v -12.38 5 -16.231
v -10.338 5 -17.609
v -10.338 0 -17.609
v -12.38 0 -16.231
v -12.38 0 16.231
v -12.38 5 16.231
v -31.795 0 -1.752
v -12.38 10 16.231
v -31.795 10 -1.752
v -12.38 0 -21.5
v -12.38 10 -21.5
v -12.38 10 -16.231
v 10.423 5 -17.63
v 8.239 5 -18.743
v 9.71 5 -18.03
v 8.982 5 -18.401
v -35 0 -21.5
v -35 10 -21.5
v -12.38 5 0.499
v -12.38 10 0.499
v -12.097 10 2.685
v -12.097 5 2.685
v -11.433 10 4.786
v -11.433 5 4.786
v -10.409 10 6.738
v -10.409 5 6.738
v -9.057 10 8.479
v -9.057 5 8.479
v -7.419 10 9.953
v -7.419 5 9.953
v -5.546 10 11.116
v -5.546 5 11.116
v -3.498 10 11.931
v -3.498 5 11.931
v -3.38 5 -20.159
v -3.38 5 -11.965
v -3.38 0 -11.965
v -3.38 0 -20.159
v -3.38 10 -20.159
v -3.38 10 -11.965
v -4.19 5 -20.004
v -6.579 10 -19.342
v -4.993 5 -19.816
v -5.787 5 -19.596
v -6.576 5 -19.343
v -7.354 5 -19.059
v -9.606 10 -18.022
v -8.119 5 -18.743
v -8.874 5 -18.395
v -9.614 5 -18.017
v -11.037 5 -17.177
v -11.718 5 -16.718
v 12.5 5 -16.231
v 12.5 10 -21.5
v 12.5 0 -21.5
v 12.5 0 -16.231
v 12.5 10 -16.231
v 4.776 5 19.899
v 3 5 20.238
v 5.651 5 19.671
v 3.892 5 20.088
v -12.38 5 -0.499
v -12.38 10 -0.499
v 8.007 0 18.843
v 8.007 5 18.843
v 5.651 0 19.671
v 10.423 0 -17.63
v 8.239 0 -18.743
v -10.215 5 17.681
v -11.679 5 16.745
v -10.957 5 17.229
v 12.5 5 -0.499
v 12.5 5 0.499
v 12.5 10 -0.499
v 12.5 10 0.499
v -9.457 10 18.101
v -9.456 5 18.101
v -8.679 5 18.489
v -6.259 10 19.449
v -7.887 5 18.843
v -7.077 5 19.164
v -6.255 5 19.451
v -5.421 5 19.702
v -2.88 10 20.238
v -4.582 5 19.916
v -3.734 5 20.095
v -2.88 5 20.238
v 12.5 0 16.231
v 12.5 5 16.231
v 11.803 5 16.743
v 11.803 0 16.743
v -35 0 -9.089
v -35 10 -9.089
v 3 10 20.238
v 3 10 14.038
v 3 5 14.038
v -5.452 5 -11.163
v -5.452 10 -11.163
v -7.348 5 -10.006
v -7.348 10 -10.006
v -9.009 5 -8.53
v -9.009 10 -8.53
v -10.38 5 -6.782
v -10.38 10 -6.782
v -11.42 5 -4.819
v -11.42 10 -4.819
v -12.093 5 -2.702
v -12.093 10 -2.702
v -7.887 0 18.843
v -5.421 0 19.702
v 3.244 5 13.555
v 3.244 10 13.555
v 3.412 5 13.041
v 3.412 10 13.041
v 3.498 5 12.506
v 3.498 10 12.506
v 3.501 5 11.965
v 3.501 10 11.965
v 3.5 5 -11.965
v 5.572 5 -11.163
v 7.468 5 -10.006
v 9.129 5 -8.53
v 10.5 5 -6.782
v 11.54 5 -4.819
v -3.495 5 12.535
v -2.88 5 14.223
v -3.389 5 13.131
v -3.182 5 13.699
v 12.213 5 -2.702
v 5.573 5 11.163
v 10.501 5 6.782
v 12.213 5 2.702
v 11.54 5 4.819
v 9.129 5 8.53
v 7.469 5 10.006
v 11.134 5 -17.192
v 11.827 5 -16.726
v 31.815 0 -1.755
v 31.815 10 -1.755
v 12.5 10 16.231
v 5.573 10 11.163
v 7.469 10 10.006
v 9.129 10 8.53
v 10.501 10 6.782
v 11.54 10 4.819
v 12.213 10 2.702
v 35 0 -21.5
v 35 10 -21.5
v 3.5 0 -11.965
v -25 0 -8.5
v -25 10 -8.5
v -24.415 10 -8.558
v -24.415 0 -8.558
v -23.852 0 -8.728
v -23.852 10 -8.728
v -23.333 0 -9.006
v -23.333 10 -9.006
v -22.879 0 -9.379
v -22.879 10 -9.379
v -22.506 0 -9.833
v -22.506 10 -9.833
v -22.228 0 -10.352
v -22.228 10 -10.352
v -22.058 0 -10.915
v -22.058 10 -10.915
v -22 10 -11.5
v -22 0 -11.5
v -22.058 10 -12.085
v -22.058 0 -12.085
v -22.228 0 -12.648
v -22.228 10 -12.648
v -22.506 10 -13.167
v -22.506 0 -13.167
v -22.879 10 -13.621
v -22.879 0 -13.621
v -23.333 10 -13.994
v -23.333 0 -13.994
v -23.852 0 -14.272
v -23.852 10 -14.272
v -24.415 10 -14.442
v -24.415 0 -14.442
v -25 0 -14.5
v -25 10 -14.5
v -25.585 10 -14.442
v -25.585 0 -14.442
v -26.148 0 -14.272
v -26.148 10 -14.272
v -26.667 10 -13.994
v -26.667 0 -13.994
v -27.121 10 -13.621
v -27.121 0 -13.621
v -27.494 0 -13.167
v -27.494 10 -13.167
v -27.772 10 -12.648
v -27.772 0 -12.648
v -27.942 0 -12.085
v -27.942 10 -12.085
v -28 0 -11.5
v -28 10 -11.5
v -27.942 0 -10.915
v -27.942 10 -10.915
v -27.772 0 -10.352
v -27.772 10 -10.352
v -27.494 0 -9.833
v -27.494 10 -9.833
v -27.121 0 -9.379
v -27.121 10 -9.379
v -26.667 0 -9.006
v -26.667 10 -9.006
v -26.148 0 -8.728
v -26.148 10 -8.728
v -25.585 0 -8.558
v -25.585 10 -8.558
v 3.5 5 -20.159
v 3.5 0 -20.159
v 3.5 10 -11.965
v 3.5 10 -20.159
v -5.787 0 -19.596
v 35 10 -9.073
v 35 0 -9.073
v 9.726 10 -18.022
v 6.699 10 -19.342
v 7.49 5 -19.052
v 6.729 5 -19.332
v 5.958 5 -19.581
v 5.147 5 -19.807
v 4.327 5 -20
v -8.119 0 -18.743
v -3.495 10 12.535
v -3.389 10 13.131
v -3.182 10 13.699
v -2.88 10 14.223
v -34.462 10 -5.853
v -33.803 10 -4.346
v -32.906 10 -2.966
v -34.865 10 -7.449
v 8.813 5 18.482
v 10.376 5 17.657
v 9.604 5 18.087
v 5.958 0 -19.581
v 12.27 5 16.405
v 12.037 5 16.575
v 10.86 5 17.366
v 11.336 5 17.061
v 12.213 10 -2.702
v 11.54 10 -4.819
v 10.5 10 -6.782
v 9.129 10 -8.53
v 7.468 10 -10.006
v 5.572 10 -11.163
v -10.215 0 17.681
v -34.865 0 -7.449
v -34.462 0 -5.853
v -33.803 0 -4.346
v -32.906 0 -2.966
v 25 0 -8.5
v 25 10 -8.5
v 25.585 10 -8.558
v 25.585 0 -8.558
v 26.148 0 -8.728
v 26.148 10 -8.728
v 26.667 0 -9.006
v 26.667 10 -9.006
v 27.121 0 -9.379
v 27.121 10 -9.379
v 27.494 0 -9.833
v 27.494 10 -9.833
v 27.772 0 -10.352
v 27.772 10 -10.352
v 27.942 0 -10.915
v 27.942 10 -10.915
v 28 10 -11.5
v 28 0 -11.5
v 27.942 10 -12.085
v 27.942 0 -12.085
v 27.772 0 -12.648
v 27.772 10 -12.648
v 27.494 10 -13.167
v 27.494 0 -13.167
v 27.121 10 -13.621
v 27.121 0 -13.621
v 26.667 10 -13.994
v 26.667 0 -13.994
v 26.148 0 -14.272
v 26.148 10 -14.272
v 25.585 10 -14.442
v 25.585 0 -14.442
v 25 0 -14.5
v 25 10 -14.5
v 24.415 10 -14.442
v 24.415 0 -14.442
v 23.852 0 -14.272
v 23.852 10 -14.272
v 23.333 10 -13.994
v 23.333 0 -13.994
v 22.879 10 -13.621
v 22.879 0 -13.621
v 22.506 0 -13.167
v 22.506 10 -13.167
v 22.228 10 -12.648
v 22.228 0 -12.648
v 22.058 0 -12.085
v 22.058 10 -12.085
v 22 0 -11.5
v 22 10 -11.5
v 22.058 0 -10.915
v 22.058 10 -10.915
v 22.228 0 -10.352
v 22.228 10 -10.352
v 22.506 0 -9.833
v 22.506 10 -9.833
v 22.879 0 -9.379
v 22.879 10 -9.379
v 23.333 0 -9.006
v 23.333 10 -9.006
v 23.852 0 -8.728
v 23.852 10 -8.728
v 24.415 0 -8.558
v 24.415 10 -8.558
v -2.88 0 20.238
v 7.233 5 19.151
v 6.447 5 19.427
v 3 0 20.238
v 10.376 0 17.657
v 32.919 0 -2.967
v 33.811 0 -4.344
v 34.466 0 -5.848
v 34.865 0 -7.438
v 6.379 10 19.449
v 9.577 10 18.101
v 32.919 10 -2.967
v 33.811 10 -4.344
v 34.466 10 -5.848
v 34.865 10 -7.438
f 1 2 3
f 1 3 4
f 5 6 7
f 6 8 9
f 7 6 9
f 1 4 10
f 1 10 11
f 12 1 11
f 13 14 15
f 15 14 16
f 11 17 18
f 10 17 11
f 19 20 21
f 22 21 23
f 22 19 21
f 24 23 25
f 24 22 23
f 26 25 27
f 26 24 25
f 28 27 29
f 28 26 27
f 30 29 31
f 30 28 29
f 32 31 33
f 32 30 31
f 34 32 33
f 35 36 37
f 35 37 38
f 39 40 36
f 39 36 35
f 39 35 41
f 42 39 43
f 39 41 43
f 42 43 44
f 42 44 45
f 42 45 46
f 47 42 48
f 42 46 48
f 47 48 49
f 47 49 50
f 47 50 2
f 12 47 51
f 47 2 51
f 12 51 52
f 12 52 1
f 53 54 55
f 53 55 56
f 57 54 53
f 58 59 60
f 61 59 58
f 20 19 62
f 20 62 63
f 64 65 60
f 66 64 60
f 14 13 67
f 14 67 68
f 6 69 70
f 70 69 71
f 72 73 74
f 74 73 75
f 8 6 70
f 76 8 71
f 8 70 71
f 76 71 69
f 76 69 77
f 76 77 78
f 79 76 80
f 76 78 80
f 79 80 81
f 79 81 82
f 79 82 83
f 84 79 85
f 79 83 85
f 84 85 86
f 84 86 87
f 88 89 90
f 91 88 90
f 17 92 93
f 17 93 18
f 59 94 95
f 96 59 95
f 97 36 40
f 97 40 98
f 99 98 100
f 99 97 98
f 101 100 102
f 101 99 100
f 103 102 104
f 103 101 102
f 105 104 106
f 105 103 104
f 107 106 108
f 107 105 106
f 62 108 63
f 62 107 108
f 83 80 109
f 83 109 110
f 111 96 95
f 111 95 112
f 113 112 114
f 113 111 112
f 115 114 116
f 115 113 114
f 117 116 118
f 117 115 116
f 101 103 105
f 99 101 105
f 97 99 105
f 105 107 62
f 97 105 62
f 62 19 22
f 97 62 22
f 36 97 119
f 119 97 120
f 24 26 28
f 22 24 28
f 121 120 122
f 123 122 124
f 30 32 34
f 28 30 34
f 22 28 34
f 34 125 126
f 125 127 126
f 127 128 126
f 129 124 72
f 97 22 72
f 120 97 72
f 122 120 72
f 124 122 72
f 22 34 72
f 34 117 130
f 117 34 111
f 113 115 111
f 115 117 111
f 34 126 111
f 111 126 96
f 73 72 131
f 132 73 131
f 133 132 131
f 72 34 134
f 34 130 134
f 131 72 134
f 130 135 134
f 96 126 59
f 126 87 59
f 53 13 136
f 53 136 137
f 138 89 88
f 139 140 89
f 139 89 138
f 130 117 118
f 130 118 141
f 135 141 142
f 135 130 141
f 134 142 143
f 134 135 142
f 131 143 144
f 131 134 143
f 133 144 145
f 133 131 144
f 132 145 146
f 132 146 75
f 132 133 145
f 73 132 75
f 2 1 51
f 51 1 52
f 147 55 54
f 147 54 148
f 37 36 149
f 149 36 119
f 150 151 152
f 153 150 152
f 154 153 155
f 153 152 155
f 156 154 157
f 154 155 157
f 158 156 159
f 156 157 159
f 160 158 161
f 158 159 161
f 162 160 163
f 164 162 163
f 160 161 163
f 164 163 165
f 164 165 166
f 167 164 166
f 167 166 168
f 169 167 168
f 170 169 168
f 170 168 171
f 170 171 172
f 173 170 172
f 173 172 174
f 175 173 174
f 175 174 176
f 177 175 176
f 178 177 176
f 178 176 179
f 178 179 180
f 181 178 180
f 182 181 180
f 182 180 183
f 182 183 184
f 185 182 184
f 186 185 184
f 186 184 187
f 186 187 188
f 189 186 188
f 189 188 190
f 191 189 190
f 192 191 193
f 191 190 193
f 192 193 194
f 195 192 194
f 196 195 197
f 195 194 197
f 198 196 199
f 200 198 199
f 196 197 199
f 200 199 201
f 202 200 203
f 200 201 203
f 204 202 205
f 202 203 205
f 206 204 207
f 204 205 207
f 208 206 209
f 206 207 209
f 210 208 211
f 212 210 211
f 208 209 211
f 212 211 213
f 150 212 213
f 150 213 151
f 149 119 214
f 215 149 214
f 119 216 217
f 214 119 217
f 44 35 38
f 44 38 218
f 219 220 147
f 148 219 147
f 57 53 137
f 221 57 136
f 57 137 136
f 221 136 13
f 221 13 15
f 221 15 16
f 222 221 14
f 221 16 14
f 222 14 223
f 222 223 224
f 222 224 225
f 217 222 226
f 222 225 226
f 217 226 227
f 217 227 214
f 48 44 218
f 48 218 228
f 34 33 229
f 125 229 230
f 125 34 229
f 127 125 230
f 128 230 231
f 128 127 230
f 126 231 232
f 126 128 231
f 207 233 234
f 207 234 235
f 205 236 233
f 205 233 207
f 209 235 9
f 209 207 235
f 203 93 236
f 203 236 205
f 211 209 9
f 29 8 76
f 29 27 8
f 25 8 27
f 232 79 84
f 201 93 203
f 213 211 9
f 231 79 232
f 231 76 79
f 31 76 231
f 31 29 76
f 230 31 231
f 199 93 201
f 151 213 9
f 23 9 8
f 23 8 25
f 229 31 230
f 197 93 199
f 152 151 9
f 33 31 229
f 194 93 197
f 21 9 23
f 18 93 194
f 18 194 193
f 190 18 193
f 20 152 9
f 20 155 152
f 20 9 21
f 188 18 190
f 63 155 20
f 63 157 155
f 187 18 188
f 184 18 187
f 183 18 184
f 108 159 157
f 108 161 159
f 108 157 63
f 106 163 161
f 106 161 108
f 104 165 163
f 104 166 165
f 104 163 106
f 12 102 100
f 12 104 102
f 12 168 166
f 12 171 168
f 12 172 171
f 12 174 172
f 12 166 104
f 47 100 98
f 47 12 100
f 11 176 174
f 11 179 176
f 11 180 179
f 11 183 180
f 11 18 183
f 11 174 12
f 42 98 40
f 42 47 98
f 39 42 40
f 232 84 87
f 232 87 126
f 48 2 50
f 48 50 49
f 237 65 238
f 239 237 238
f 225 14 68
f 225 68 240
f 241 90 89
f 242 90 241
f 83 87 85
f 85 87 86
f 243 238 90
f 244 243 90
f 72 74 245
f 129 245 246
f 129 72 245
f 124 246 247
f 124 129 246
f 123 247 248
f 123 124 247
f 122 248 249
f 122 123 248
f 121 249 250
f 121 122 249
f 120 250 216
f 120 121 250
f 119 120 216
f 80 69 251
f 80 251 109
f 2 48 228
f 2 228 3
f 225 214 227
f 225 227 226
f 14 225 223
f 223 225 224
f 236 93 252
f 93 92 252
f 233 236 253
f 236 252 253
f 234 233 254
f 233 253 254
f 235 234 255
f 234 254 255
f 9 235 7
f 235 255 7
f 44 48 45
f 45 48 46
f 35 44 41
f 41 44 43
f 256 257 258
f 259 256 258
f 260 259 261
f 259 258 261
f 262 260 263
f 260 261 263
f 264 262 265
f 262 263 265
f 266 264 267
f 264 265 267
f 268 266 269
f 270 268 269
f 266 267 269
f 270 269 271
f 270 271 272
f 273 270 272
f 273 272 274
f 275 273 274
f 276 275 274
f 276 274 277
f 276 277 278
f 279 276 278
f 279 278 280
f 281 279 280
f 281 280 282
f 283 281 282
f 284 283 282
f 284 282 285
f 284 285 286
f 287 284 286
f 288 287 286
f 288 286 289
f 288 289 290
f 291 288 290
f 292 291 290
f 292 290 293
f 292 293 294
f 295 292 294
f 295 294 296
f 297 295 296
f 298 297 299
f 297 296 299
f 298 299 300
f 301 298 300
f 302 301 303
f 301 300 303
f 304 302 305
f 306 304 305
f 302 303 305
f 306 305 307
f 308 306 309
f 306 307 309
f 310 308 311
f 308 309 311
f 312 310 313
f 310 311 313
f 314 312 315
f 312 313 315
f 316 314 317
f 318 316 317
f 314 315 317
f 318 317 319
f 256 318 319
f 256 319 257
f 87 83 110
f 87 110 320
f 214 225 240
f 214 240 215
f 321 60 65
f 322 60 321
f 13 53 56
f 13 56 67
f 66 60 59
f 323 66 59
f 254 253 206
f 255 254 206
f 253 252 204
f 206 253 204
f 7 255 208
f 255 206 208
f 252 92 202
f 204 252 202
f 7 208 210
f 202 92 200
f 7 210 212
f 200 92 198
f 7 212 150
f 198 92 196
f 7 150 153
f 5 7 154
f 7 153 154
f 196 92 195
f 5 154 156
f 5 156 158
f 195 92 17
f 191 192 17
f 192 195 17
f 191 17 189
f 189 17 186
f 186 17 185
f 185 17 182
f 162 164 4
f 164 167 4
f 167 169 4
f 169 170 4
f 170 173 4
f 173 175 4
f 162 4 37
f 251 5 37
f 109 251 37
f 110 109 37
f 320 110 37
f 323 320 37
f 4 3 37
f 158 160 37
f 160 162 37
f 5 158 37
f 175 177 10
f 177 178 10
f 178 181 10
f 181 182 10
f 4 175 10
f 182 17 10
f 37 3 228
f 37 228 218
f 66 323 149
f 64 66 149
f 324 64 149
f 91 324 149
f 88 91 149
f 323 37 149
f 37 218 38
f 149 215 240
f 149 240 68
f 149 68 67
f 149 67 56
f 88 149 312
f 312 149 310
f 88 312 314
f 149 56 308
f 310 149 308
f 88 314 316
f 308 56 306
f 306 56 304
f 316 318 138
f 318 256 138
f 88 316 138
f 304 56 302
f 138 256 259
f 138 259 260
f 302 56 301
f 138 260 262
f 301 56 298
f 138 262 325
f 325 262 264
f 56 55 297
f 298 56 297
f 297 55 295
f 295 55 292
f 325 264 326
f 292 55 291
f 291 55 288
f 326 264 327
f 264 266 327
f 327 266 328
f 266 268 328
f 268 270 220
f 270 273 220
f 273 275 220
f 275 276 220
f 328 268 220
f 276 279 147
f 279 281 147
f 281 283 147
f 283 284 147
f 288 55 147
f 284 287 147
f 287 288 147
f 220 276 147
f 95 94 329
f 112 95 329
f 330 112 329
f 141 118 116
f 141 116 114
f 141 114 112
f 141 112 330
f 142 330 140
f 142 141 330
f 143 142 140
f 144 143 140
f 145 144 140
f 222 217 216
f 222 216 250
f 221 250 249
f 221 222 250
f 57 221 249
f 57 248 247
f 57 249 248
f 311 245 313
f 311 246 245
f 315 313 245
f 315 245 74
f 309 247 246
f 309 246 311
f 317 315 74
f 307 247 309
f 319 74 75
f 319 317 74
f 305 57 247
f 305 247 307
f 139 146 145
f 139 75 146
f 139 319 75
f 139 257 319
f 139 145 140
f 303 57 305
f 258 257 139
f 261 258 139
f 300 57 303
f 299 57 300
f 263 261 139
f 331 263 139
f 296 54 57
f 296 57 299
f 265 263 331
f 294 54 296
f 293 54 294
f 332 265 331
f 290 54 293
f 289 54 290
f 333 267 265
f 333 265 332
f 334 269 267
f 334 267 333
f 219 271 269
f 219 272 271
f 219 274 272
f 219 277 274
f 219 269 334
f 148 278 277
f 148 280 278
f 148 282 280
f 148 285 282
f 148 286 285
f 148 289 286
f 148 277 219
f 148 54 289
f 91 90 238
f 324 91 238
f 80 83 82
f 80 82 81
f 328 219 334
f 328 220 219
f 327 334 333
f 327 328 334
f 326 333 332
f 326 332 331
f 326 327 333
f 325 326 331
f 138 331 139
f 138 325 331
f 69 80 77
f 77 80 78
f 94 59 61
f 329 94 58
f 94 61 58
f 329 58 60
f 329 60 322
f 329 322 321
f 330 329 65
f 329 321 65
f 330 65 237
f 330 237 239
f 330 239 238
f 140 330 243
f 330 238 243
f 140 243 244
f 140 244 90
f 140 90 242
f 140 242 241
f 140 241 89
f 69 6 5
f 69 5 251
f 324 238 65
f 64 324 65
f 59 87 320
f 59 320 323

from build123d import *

# Parameters (mm, degrees)
SKETCH_1_W             = 70
SKETCH_1_H             = 43
EXTRUDE_1_DEPTH        = 10
SKETCH_8_W             = 24.88
SKETCH_8_H             = 5
CUT_EXTRUDE_4_DEPTH    = 57.338264084
EXTRUDE_1_2_DEPTH      = 5
EXTRUDE_1_2_DEPTH_BACK = 2
SKETCH_11_R            = 20.45
SKETCH_11_R_2          = 12.45
CUT_EXTRUDE_6_DEPTH    = 5
CUT_EXTRUDE_7_DEPTH    = 5
SKETCH_16_W            = 5.88
SKETCH_16_H            = 11
CUT_EXTRUDE_8_DEPTH    = 5
SKETCH_17_W            = 5.88
SKETCH_17_H            = 8.352111755
CUT_EXTRUDE_9_DEPTH    = 5
CUT_EXTRUDE_10_DEPTH   = 5
CUT_EXTRUDE_11_DEPTH   = 5
SKETCH_21_R            = 3
CUT_EXTRUDE_12_DEPTH   = 43.275879648
SKETCH_22_R            = 3
CUT_EXTRUDE_13_DEPTH   = 43.275879648
SKETCH_24_R            = 3.51
CUT_EXTRUDE_15_DEPTH   = 7
SKETCH_27_W            = 5.88
SKETCH_27_H            = 8.139673367
CUT_EXTRUDE_16_DEPTH   = 7
SKETCH_31_W            = 6.88
SKETCH_31_H            = 8.484679277
CUT_EXTRUDE_21_DEPTH   = 14.5
CUT_EXTRUDE_22_DEPTH   = 42.379342672
CUT_EXTRUDE_23_DEPTH   = 42.379342672
CUT_EXTRUDE_24_DEPTH   = 42.379342672
CUT_EXTRUDE_25_DEPTH   = 14.5
CUT_EXTRUDE_26_DEPTH   = 14.5
CUT_EXTRUDE_27_DEPTH   = 14.5
FILLET_1_R             = 10


with BuildPart() as part:
    # 草圖1 → Extrude 1 (new body)
    with BuildSketch(Plane(origin=(0, 0, 0), x_dir=(1, 0, 0), z_dir=(0, 1, 0))):
        Rectangle(SKETCH_1_W, SKETCH_1_H)
    extrude(amount=EXTRUDE_1_DEPTH)

    # 草圖8 → 除料-伸長4 (cut, through all)
    with BuildSketch(Plane.XY.offset(21.5)):
        with Locations((0.06, 7.5)):
            Rectangle(SKETCH_8_W, SKETCH_8_H)
    extrude(amount=-CUT_EXTRUDE_4_DEPTH, mode=Mode.SUBTRACT)

    # 草圖11 → Extrude 1 2 (add, two sides: drawn at the far end of the back side and taken through both)
    with BuildSketch(Plane(origin=(0, 5, 0), x_dir=(1, 0, 0), z_dir=(0, 1, 0)).offset(-EXTRUDE_1_2_DEPTH_BACK)):
        with Locations((0.06, 0)):
            Circle(SKETCH_11_R)
        with Locations((0.06, 0)):
            Circle(SKETCH_11_R_2, mode=Mode.SUBTRACT)
    extrude(amount=EXTRUDE_1_2_DEPTH + EXTRUDE_1_2_DEPTH_BACK)

    # 草圖14 → 除料-伸長6 (cut)
    with BuildSketch(Plane(origin=(0, 5, 0), x_dir=(1, 0, 0), z_dir=(0, 1, 0))):
        Polygon((0.06, -20.45), (12.5, -20.45), (12.5, -21.5), (-12.38, -21.5), (-12.38, -20.45), align=None)
    extrude(amount=-CUT_EXTRUDE_6_DEPTH, mode=Mode.SUBTRACT)

    # 草圖15 → 除料-伸長7 (cut)
    with BuildSketch(Plane(origin=(0, 5, 0), x_dir=(1, 0, 0), z_dir=(0, 1, 0))):
        Polygon((0.06, 20.45), (12.5, 20.45), (12.5, 21.5), (-12.38, 21.5), (-12.38, 20.45), align=None)
    extrude(amount=-CUT_EXTRUDE_7_DEPTH, mode=Mode.SUBTRACT)

    # 草圖16 → 除料-伸長8 (cut)
    with BuildSketch(Plane(origin=(0, 10, 0), x_dir=(1, 0, 0), z_dir=(0, 1, 0))):
        with Locations((0.06, 17.597888245)):
            Rectangle(SKETCH_16_W, SKETCH_16_H)
    extrude(amount=-CUT_EXTRUDE_8_DEPTH, mode=Mode.SUBTRACT)

    # 草圖17 → 除料-伸長9 (cut)
    with BuildSketch(Plane(origin=(0, 10, 0), x_dir=(1, 0, 0), z_dir=(0, 1, 0))):
        with Locations((0.06, -16.273944123)):
            Rectangle(SKETCH_17_W, SKETCH_17_H)
    extrude(amount=-CUT_EXTRUDE_9_DEPTH, mode=Mode.SUBTRACT)

    # 草圖19 → 除料-伸長10 (cut)
    with BuildSketch(Plane(origin=(0, 5, 0), x_dir=(1, 0, 0), z_dir=(0, 1, 0))):
        Polygon((-2.88, 20.237561612), (-2.88, 20.45), (2.98755849, 20.45), (3, 20.237561612), align=None)
    extrude(amount=-CUT_EXTRUDE_10_DEPTH, mode=Mode.SUBTRACT)

    # 草圖20 → 除料-伸長11 (cut)
    with BuildSketch(Plane(origin=(0, 5, 0), x_dir=(1, 0, 0), z_dir=(0, 1, 0))):
        Polygon((3, -20.237561612), (3, -20.45), (-2.887827835, -20.45), (-2.88, -20.237561612), align=None)
    extrude(amount=-CUT_EXTRUDE_11_DEPTH, mode=Mode.SUBTRACT)

    # 草圖21 → 除料-伸長12 (cut, through all)
    with BuildSketch(Plane(origin=(0, 10, 0), x_dir=(1, 0, 0), z_dir=(0, 1, 0))):
        with Locations(Location((-25, 11.5, 0), (0, 0, 270))):
            Circle(SKETCH_21_R)
    extrude(amount=-CUT_EXTRUDE_12_DEPTH, mode=Mode.SUBTRACT)

    # 草圖22 → 除料-伸長13 (cut, through all)
    with BuildSketch(Plane(origin=(0, 10, 0), x_dir=(1, 0, 0), z_dir=(0, 1, 0))):
        with Locations(Location((25, 11.5, 0), (0, 0, 270))):
            Circle(SKETCH_22_R)
    extrude(amount=-CUT_EXTRUDE_13_DEPTH, mode=Mode.SUBTRACT)

    # 草圖24 → 除料-伸長15 (cut)
    with BuildSketch(Plane(origin=(0, 5, 0), x_dir=(1, 0, 0), z_dir=(0, 1, 0))):
        with Locations((0, -12.216230782)):
            Circle(SKETCH_24_R)
    extrude(amount=CUT_EXTRUDE_15_DEPTH, mode=Mode.SUBTRACT)

    # 草圖27 → 除料-伸長16 (cut)
    with BuildSketch(Plane(origin=(0, 5, 0), x_dir=(1, 0, 0), z_dir=(0, 1, 0))):
        with Locations((0.06, 16.167724929)):
            Rectangle(SKETCH_27_W, SKETCH_27_H)
    extrude(amount=-CUT_EXTRUDE_16_DEPTH, mode=Mode.SUBTRACT)

    # 草圖31 → 除料-伸長21 (cut)
    with BuildSketch(Plane(origin=(0, 10, 0), x_dir=(1, 0, 0), z_dir=(0, 1, 0))):
        with Locations((0.06, 16.207660362)):
            Rectangle(SKETCH_31_W, SKETCH_31_H)
    extrude(amount=-CUT_EXTRUDE_21_DEPTH, mode=Mode.SUBTRACT)

    # 草圖32 → 除料-伸長22 (cut, through all)
    with BuildSketch(Plane(origin=(0, 5, 0), x_dir=(1, 0, 0), z_dir=(0, 1, 0))):
        Polygon((12.5, 20.45), (12.5, 16.231109019), (10.42274151, 17.629976982), (8.239234926, 18.743068479), (5.957708545, 19.581101448), (3.5, 20.158593701), (3.5, 20.45), align=None)
    extrude(amount=-CUT_EXTRUDE_22_DEPTH, mode=Mode.SUBTRACT)

    # 草圖33 → 除料-伸長23 (cut, through all)
    with BuildSketch(Plane(origin=(0, 5, 0), x_dir=(1, 0, 0), z_dir=(0, 1, 0))):
        Polygon((-12.38, 16.231109019), (-12.38, 20.45), (-3.38, 20.45), (-3.38, 20.158593701), (-5.787343839, 19.596200398), (-8.119234926, 18.743068479), (-10.338150934, 17.609115741), align=None)
    extrude(amount=-CUT_EXTRUDE_23_DEPTH, mode=Mode.SUBTRACT)

    # 草圖34 → 除料-伸長24 (cut, through all)
    with BuildSketch(Plane(origin=(0, 5, 0), x_dir=(1, 0, 0), z_dir=(0, 1, 0))):
        Polygon((-12.38, -20.45), (-12.38, -16.231109019), (-10.215137429, -17.681177869), (-7.886635489, -18.842862957), (-5.420645085, -19.701904209), (-2.88, -20.237561612), (-2.887827835, -20.45), align=None)
    extrude(amount=-CUT_EXTRUDE_24_DEPTH, mode=Mode.SUBTRACT)

    # 草圖35 → 除料-伸長25 (cut)
    with BuildSketch(Plane(origin=(0, 5, 0), x_dir=(1, 0, 0), z_dir=(0, 1, 0))):
        Polygon((3, -20.237561612), (3, -20.45), (12.5, -20.45), (12.5, -16.231109019), (11.802562641, -16.742602026), (10.376101904, -17.657308444), (8.006635489, -18.842862957), (5.650656404, -19.670970006), align=None)
    extrude(amount=-CUT_EXTRUDE_25_DEPTH, mode=Mode.SUBTRACT)

    # 草圖37 → 除料-伸長26 (cut)
    with BuildSketch(Plane(origin=(0, 10, 0), x_dir=(1, 0, 0), z_dir=(0, 1, 0))):
        Polygon((-35, -21.5), (-12.38, -21.5), (-12.38, -16.231109019), (-35, 4.72072635), align=None)
    extrude(amount=-CUT_EXTRUDE_26_DEPTH, mode=Mode.SUBTRACT)

    # 草圖38 → 除料-伸長27 (cut)
    with BuildSketch(Plane(origin=(0, 10, 0), x_dir=(1, 0, 0), z_dir=(0, 1, 0))):
        Polygon((35, 4.72072635), (35, -21.5), (12.5, -21.5), (12.5, -16.231109019), align=None)
    extrude(amount=-CUT_EXTRUDE_27_DEPTH, mode=Mode.SUBTRACT)

    # 圓角1
    fillet_1_edges = [part.edges().sort_by_distance(p)[0] for p in [
        (-35, 5, -4.72072635),
        (35, 5, -4.72072635),
    ]]
    fillet(fillet_1_edges, radius=FILLET_1_R)


solid = part.part
